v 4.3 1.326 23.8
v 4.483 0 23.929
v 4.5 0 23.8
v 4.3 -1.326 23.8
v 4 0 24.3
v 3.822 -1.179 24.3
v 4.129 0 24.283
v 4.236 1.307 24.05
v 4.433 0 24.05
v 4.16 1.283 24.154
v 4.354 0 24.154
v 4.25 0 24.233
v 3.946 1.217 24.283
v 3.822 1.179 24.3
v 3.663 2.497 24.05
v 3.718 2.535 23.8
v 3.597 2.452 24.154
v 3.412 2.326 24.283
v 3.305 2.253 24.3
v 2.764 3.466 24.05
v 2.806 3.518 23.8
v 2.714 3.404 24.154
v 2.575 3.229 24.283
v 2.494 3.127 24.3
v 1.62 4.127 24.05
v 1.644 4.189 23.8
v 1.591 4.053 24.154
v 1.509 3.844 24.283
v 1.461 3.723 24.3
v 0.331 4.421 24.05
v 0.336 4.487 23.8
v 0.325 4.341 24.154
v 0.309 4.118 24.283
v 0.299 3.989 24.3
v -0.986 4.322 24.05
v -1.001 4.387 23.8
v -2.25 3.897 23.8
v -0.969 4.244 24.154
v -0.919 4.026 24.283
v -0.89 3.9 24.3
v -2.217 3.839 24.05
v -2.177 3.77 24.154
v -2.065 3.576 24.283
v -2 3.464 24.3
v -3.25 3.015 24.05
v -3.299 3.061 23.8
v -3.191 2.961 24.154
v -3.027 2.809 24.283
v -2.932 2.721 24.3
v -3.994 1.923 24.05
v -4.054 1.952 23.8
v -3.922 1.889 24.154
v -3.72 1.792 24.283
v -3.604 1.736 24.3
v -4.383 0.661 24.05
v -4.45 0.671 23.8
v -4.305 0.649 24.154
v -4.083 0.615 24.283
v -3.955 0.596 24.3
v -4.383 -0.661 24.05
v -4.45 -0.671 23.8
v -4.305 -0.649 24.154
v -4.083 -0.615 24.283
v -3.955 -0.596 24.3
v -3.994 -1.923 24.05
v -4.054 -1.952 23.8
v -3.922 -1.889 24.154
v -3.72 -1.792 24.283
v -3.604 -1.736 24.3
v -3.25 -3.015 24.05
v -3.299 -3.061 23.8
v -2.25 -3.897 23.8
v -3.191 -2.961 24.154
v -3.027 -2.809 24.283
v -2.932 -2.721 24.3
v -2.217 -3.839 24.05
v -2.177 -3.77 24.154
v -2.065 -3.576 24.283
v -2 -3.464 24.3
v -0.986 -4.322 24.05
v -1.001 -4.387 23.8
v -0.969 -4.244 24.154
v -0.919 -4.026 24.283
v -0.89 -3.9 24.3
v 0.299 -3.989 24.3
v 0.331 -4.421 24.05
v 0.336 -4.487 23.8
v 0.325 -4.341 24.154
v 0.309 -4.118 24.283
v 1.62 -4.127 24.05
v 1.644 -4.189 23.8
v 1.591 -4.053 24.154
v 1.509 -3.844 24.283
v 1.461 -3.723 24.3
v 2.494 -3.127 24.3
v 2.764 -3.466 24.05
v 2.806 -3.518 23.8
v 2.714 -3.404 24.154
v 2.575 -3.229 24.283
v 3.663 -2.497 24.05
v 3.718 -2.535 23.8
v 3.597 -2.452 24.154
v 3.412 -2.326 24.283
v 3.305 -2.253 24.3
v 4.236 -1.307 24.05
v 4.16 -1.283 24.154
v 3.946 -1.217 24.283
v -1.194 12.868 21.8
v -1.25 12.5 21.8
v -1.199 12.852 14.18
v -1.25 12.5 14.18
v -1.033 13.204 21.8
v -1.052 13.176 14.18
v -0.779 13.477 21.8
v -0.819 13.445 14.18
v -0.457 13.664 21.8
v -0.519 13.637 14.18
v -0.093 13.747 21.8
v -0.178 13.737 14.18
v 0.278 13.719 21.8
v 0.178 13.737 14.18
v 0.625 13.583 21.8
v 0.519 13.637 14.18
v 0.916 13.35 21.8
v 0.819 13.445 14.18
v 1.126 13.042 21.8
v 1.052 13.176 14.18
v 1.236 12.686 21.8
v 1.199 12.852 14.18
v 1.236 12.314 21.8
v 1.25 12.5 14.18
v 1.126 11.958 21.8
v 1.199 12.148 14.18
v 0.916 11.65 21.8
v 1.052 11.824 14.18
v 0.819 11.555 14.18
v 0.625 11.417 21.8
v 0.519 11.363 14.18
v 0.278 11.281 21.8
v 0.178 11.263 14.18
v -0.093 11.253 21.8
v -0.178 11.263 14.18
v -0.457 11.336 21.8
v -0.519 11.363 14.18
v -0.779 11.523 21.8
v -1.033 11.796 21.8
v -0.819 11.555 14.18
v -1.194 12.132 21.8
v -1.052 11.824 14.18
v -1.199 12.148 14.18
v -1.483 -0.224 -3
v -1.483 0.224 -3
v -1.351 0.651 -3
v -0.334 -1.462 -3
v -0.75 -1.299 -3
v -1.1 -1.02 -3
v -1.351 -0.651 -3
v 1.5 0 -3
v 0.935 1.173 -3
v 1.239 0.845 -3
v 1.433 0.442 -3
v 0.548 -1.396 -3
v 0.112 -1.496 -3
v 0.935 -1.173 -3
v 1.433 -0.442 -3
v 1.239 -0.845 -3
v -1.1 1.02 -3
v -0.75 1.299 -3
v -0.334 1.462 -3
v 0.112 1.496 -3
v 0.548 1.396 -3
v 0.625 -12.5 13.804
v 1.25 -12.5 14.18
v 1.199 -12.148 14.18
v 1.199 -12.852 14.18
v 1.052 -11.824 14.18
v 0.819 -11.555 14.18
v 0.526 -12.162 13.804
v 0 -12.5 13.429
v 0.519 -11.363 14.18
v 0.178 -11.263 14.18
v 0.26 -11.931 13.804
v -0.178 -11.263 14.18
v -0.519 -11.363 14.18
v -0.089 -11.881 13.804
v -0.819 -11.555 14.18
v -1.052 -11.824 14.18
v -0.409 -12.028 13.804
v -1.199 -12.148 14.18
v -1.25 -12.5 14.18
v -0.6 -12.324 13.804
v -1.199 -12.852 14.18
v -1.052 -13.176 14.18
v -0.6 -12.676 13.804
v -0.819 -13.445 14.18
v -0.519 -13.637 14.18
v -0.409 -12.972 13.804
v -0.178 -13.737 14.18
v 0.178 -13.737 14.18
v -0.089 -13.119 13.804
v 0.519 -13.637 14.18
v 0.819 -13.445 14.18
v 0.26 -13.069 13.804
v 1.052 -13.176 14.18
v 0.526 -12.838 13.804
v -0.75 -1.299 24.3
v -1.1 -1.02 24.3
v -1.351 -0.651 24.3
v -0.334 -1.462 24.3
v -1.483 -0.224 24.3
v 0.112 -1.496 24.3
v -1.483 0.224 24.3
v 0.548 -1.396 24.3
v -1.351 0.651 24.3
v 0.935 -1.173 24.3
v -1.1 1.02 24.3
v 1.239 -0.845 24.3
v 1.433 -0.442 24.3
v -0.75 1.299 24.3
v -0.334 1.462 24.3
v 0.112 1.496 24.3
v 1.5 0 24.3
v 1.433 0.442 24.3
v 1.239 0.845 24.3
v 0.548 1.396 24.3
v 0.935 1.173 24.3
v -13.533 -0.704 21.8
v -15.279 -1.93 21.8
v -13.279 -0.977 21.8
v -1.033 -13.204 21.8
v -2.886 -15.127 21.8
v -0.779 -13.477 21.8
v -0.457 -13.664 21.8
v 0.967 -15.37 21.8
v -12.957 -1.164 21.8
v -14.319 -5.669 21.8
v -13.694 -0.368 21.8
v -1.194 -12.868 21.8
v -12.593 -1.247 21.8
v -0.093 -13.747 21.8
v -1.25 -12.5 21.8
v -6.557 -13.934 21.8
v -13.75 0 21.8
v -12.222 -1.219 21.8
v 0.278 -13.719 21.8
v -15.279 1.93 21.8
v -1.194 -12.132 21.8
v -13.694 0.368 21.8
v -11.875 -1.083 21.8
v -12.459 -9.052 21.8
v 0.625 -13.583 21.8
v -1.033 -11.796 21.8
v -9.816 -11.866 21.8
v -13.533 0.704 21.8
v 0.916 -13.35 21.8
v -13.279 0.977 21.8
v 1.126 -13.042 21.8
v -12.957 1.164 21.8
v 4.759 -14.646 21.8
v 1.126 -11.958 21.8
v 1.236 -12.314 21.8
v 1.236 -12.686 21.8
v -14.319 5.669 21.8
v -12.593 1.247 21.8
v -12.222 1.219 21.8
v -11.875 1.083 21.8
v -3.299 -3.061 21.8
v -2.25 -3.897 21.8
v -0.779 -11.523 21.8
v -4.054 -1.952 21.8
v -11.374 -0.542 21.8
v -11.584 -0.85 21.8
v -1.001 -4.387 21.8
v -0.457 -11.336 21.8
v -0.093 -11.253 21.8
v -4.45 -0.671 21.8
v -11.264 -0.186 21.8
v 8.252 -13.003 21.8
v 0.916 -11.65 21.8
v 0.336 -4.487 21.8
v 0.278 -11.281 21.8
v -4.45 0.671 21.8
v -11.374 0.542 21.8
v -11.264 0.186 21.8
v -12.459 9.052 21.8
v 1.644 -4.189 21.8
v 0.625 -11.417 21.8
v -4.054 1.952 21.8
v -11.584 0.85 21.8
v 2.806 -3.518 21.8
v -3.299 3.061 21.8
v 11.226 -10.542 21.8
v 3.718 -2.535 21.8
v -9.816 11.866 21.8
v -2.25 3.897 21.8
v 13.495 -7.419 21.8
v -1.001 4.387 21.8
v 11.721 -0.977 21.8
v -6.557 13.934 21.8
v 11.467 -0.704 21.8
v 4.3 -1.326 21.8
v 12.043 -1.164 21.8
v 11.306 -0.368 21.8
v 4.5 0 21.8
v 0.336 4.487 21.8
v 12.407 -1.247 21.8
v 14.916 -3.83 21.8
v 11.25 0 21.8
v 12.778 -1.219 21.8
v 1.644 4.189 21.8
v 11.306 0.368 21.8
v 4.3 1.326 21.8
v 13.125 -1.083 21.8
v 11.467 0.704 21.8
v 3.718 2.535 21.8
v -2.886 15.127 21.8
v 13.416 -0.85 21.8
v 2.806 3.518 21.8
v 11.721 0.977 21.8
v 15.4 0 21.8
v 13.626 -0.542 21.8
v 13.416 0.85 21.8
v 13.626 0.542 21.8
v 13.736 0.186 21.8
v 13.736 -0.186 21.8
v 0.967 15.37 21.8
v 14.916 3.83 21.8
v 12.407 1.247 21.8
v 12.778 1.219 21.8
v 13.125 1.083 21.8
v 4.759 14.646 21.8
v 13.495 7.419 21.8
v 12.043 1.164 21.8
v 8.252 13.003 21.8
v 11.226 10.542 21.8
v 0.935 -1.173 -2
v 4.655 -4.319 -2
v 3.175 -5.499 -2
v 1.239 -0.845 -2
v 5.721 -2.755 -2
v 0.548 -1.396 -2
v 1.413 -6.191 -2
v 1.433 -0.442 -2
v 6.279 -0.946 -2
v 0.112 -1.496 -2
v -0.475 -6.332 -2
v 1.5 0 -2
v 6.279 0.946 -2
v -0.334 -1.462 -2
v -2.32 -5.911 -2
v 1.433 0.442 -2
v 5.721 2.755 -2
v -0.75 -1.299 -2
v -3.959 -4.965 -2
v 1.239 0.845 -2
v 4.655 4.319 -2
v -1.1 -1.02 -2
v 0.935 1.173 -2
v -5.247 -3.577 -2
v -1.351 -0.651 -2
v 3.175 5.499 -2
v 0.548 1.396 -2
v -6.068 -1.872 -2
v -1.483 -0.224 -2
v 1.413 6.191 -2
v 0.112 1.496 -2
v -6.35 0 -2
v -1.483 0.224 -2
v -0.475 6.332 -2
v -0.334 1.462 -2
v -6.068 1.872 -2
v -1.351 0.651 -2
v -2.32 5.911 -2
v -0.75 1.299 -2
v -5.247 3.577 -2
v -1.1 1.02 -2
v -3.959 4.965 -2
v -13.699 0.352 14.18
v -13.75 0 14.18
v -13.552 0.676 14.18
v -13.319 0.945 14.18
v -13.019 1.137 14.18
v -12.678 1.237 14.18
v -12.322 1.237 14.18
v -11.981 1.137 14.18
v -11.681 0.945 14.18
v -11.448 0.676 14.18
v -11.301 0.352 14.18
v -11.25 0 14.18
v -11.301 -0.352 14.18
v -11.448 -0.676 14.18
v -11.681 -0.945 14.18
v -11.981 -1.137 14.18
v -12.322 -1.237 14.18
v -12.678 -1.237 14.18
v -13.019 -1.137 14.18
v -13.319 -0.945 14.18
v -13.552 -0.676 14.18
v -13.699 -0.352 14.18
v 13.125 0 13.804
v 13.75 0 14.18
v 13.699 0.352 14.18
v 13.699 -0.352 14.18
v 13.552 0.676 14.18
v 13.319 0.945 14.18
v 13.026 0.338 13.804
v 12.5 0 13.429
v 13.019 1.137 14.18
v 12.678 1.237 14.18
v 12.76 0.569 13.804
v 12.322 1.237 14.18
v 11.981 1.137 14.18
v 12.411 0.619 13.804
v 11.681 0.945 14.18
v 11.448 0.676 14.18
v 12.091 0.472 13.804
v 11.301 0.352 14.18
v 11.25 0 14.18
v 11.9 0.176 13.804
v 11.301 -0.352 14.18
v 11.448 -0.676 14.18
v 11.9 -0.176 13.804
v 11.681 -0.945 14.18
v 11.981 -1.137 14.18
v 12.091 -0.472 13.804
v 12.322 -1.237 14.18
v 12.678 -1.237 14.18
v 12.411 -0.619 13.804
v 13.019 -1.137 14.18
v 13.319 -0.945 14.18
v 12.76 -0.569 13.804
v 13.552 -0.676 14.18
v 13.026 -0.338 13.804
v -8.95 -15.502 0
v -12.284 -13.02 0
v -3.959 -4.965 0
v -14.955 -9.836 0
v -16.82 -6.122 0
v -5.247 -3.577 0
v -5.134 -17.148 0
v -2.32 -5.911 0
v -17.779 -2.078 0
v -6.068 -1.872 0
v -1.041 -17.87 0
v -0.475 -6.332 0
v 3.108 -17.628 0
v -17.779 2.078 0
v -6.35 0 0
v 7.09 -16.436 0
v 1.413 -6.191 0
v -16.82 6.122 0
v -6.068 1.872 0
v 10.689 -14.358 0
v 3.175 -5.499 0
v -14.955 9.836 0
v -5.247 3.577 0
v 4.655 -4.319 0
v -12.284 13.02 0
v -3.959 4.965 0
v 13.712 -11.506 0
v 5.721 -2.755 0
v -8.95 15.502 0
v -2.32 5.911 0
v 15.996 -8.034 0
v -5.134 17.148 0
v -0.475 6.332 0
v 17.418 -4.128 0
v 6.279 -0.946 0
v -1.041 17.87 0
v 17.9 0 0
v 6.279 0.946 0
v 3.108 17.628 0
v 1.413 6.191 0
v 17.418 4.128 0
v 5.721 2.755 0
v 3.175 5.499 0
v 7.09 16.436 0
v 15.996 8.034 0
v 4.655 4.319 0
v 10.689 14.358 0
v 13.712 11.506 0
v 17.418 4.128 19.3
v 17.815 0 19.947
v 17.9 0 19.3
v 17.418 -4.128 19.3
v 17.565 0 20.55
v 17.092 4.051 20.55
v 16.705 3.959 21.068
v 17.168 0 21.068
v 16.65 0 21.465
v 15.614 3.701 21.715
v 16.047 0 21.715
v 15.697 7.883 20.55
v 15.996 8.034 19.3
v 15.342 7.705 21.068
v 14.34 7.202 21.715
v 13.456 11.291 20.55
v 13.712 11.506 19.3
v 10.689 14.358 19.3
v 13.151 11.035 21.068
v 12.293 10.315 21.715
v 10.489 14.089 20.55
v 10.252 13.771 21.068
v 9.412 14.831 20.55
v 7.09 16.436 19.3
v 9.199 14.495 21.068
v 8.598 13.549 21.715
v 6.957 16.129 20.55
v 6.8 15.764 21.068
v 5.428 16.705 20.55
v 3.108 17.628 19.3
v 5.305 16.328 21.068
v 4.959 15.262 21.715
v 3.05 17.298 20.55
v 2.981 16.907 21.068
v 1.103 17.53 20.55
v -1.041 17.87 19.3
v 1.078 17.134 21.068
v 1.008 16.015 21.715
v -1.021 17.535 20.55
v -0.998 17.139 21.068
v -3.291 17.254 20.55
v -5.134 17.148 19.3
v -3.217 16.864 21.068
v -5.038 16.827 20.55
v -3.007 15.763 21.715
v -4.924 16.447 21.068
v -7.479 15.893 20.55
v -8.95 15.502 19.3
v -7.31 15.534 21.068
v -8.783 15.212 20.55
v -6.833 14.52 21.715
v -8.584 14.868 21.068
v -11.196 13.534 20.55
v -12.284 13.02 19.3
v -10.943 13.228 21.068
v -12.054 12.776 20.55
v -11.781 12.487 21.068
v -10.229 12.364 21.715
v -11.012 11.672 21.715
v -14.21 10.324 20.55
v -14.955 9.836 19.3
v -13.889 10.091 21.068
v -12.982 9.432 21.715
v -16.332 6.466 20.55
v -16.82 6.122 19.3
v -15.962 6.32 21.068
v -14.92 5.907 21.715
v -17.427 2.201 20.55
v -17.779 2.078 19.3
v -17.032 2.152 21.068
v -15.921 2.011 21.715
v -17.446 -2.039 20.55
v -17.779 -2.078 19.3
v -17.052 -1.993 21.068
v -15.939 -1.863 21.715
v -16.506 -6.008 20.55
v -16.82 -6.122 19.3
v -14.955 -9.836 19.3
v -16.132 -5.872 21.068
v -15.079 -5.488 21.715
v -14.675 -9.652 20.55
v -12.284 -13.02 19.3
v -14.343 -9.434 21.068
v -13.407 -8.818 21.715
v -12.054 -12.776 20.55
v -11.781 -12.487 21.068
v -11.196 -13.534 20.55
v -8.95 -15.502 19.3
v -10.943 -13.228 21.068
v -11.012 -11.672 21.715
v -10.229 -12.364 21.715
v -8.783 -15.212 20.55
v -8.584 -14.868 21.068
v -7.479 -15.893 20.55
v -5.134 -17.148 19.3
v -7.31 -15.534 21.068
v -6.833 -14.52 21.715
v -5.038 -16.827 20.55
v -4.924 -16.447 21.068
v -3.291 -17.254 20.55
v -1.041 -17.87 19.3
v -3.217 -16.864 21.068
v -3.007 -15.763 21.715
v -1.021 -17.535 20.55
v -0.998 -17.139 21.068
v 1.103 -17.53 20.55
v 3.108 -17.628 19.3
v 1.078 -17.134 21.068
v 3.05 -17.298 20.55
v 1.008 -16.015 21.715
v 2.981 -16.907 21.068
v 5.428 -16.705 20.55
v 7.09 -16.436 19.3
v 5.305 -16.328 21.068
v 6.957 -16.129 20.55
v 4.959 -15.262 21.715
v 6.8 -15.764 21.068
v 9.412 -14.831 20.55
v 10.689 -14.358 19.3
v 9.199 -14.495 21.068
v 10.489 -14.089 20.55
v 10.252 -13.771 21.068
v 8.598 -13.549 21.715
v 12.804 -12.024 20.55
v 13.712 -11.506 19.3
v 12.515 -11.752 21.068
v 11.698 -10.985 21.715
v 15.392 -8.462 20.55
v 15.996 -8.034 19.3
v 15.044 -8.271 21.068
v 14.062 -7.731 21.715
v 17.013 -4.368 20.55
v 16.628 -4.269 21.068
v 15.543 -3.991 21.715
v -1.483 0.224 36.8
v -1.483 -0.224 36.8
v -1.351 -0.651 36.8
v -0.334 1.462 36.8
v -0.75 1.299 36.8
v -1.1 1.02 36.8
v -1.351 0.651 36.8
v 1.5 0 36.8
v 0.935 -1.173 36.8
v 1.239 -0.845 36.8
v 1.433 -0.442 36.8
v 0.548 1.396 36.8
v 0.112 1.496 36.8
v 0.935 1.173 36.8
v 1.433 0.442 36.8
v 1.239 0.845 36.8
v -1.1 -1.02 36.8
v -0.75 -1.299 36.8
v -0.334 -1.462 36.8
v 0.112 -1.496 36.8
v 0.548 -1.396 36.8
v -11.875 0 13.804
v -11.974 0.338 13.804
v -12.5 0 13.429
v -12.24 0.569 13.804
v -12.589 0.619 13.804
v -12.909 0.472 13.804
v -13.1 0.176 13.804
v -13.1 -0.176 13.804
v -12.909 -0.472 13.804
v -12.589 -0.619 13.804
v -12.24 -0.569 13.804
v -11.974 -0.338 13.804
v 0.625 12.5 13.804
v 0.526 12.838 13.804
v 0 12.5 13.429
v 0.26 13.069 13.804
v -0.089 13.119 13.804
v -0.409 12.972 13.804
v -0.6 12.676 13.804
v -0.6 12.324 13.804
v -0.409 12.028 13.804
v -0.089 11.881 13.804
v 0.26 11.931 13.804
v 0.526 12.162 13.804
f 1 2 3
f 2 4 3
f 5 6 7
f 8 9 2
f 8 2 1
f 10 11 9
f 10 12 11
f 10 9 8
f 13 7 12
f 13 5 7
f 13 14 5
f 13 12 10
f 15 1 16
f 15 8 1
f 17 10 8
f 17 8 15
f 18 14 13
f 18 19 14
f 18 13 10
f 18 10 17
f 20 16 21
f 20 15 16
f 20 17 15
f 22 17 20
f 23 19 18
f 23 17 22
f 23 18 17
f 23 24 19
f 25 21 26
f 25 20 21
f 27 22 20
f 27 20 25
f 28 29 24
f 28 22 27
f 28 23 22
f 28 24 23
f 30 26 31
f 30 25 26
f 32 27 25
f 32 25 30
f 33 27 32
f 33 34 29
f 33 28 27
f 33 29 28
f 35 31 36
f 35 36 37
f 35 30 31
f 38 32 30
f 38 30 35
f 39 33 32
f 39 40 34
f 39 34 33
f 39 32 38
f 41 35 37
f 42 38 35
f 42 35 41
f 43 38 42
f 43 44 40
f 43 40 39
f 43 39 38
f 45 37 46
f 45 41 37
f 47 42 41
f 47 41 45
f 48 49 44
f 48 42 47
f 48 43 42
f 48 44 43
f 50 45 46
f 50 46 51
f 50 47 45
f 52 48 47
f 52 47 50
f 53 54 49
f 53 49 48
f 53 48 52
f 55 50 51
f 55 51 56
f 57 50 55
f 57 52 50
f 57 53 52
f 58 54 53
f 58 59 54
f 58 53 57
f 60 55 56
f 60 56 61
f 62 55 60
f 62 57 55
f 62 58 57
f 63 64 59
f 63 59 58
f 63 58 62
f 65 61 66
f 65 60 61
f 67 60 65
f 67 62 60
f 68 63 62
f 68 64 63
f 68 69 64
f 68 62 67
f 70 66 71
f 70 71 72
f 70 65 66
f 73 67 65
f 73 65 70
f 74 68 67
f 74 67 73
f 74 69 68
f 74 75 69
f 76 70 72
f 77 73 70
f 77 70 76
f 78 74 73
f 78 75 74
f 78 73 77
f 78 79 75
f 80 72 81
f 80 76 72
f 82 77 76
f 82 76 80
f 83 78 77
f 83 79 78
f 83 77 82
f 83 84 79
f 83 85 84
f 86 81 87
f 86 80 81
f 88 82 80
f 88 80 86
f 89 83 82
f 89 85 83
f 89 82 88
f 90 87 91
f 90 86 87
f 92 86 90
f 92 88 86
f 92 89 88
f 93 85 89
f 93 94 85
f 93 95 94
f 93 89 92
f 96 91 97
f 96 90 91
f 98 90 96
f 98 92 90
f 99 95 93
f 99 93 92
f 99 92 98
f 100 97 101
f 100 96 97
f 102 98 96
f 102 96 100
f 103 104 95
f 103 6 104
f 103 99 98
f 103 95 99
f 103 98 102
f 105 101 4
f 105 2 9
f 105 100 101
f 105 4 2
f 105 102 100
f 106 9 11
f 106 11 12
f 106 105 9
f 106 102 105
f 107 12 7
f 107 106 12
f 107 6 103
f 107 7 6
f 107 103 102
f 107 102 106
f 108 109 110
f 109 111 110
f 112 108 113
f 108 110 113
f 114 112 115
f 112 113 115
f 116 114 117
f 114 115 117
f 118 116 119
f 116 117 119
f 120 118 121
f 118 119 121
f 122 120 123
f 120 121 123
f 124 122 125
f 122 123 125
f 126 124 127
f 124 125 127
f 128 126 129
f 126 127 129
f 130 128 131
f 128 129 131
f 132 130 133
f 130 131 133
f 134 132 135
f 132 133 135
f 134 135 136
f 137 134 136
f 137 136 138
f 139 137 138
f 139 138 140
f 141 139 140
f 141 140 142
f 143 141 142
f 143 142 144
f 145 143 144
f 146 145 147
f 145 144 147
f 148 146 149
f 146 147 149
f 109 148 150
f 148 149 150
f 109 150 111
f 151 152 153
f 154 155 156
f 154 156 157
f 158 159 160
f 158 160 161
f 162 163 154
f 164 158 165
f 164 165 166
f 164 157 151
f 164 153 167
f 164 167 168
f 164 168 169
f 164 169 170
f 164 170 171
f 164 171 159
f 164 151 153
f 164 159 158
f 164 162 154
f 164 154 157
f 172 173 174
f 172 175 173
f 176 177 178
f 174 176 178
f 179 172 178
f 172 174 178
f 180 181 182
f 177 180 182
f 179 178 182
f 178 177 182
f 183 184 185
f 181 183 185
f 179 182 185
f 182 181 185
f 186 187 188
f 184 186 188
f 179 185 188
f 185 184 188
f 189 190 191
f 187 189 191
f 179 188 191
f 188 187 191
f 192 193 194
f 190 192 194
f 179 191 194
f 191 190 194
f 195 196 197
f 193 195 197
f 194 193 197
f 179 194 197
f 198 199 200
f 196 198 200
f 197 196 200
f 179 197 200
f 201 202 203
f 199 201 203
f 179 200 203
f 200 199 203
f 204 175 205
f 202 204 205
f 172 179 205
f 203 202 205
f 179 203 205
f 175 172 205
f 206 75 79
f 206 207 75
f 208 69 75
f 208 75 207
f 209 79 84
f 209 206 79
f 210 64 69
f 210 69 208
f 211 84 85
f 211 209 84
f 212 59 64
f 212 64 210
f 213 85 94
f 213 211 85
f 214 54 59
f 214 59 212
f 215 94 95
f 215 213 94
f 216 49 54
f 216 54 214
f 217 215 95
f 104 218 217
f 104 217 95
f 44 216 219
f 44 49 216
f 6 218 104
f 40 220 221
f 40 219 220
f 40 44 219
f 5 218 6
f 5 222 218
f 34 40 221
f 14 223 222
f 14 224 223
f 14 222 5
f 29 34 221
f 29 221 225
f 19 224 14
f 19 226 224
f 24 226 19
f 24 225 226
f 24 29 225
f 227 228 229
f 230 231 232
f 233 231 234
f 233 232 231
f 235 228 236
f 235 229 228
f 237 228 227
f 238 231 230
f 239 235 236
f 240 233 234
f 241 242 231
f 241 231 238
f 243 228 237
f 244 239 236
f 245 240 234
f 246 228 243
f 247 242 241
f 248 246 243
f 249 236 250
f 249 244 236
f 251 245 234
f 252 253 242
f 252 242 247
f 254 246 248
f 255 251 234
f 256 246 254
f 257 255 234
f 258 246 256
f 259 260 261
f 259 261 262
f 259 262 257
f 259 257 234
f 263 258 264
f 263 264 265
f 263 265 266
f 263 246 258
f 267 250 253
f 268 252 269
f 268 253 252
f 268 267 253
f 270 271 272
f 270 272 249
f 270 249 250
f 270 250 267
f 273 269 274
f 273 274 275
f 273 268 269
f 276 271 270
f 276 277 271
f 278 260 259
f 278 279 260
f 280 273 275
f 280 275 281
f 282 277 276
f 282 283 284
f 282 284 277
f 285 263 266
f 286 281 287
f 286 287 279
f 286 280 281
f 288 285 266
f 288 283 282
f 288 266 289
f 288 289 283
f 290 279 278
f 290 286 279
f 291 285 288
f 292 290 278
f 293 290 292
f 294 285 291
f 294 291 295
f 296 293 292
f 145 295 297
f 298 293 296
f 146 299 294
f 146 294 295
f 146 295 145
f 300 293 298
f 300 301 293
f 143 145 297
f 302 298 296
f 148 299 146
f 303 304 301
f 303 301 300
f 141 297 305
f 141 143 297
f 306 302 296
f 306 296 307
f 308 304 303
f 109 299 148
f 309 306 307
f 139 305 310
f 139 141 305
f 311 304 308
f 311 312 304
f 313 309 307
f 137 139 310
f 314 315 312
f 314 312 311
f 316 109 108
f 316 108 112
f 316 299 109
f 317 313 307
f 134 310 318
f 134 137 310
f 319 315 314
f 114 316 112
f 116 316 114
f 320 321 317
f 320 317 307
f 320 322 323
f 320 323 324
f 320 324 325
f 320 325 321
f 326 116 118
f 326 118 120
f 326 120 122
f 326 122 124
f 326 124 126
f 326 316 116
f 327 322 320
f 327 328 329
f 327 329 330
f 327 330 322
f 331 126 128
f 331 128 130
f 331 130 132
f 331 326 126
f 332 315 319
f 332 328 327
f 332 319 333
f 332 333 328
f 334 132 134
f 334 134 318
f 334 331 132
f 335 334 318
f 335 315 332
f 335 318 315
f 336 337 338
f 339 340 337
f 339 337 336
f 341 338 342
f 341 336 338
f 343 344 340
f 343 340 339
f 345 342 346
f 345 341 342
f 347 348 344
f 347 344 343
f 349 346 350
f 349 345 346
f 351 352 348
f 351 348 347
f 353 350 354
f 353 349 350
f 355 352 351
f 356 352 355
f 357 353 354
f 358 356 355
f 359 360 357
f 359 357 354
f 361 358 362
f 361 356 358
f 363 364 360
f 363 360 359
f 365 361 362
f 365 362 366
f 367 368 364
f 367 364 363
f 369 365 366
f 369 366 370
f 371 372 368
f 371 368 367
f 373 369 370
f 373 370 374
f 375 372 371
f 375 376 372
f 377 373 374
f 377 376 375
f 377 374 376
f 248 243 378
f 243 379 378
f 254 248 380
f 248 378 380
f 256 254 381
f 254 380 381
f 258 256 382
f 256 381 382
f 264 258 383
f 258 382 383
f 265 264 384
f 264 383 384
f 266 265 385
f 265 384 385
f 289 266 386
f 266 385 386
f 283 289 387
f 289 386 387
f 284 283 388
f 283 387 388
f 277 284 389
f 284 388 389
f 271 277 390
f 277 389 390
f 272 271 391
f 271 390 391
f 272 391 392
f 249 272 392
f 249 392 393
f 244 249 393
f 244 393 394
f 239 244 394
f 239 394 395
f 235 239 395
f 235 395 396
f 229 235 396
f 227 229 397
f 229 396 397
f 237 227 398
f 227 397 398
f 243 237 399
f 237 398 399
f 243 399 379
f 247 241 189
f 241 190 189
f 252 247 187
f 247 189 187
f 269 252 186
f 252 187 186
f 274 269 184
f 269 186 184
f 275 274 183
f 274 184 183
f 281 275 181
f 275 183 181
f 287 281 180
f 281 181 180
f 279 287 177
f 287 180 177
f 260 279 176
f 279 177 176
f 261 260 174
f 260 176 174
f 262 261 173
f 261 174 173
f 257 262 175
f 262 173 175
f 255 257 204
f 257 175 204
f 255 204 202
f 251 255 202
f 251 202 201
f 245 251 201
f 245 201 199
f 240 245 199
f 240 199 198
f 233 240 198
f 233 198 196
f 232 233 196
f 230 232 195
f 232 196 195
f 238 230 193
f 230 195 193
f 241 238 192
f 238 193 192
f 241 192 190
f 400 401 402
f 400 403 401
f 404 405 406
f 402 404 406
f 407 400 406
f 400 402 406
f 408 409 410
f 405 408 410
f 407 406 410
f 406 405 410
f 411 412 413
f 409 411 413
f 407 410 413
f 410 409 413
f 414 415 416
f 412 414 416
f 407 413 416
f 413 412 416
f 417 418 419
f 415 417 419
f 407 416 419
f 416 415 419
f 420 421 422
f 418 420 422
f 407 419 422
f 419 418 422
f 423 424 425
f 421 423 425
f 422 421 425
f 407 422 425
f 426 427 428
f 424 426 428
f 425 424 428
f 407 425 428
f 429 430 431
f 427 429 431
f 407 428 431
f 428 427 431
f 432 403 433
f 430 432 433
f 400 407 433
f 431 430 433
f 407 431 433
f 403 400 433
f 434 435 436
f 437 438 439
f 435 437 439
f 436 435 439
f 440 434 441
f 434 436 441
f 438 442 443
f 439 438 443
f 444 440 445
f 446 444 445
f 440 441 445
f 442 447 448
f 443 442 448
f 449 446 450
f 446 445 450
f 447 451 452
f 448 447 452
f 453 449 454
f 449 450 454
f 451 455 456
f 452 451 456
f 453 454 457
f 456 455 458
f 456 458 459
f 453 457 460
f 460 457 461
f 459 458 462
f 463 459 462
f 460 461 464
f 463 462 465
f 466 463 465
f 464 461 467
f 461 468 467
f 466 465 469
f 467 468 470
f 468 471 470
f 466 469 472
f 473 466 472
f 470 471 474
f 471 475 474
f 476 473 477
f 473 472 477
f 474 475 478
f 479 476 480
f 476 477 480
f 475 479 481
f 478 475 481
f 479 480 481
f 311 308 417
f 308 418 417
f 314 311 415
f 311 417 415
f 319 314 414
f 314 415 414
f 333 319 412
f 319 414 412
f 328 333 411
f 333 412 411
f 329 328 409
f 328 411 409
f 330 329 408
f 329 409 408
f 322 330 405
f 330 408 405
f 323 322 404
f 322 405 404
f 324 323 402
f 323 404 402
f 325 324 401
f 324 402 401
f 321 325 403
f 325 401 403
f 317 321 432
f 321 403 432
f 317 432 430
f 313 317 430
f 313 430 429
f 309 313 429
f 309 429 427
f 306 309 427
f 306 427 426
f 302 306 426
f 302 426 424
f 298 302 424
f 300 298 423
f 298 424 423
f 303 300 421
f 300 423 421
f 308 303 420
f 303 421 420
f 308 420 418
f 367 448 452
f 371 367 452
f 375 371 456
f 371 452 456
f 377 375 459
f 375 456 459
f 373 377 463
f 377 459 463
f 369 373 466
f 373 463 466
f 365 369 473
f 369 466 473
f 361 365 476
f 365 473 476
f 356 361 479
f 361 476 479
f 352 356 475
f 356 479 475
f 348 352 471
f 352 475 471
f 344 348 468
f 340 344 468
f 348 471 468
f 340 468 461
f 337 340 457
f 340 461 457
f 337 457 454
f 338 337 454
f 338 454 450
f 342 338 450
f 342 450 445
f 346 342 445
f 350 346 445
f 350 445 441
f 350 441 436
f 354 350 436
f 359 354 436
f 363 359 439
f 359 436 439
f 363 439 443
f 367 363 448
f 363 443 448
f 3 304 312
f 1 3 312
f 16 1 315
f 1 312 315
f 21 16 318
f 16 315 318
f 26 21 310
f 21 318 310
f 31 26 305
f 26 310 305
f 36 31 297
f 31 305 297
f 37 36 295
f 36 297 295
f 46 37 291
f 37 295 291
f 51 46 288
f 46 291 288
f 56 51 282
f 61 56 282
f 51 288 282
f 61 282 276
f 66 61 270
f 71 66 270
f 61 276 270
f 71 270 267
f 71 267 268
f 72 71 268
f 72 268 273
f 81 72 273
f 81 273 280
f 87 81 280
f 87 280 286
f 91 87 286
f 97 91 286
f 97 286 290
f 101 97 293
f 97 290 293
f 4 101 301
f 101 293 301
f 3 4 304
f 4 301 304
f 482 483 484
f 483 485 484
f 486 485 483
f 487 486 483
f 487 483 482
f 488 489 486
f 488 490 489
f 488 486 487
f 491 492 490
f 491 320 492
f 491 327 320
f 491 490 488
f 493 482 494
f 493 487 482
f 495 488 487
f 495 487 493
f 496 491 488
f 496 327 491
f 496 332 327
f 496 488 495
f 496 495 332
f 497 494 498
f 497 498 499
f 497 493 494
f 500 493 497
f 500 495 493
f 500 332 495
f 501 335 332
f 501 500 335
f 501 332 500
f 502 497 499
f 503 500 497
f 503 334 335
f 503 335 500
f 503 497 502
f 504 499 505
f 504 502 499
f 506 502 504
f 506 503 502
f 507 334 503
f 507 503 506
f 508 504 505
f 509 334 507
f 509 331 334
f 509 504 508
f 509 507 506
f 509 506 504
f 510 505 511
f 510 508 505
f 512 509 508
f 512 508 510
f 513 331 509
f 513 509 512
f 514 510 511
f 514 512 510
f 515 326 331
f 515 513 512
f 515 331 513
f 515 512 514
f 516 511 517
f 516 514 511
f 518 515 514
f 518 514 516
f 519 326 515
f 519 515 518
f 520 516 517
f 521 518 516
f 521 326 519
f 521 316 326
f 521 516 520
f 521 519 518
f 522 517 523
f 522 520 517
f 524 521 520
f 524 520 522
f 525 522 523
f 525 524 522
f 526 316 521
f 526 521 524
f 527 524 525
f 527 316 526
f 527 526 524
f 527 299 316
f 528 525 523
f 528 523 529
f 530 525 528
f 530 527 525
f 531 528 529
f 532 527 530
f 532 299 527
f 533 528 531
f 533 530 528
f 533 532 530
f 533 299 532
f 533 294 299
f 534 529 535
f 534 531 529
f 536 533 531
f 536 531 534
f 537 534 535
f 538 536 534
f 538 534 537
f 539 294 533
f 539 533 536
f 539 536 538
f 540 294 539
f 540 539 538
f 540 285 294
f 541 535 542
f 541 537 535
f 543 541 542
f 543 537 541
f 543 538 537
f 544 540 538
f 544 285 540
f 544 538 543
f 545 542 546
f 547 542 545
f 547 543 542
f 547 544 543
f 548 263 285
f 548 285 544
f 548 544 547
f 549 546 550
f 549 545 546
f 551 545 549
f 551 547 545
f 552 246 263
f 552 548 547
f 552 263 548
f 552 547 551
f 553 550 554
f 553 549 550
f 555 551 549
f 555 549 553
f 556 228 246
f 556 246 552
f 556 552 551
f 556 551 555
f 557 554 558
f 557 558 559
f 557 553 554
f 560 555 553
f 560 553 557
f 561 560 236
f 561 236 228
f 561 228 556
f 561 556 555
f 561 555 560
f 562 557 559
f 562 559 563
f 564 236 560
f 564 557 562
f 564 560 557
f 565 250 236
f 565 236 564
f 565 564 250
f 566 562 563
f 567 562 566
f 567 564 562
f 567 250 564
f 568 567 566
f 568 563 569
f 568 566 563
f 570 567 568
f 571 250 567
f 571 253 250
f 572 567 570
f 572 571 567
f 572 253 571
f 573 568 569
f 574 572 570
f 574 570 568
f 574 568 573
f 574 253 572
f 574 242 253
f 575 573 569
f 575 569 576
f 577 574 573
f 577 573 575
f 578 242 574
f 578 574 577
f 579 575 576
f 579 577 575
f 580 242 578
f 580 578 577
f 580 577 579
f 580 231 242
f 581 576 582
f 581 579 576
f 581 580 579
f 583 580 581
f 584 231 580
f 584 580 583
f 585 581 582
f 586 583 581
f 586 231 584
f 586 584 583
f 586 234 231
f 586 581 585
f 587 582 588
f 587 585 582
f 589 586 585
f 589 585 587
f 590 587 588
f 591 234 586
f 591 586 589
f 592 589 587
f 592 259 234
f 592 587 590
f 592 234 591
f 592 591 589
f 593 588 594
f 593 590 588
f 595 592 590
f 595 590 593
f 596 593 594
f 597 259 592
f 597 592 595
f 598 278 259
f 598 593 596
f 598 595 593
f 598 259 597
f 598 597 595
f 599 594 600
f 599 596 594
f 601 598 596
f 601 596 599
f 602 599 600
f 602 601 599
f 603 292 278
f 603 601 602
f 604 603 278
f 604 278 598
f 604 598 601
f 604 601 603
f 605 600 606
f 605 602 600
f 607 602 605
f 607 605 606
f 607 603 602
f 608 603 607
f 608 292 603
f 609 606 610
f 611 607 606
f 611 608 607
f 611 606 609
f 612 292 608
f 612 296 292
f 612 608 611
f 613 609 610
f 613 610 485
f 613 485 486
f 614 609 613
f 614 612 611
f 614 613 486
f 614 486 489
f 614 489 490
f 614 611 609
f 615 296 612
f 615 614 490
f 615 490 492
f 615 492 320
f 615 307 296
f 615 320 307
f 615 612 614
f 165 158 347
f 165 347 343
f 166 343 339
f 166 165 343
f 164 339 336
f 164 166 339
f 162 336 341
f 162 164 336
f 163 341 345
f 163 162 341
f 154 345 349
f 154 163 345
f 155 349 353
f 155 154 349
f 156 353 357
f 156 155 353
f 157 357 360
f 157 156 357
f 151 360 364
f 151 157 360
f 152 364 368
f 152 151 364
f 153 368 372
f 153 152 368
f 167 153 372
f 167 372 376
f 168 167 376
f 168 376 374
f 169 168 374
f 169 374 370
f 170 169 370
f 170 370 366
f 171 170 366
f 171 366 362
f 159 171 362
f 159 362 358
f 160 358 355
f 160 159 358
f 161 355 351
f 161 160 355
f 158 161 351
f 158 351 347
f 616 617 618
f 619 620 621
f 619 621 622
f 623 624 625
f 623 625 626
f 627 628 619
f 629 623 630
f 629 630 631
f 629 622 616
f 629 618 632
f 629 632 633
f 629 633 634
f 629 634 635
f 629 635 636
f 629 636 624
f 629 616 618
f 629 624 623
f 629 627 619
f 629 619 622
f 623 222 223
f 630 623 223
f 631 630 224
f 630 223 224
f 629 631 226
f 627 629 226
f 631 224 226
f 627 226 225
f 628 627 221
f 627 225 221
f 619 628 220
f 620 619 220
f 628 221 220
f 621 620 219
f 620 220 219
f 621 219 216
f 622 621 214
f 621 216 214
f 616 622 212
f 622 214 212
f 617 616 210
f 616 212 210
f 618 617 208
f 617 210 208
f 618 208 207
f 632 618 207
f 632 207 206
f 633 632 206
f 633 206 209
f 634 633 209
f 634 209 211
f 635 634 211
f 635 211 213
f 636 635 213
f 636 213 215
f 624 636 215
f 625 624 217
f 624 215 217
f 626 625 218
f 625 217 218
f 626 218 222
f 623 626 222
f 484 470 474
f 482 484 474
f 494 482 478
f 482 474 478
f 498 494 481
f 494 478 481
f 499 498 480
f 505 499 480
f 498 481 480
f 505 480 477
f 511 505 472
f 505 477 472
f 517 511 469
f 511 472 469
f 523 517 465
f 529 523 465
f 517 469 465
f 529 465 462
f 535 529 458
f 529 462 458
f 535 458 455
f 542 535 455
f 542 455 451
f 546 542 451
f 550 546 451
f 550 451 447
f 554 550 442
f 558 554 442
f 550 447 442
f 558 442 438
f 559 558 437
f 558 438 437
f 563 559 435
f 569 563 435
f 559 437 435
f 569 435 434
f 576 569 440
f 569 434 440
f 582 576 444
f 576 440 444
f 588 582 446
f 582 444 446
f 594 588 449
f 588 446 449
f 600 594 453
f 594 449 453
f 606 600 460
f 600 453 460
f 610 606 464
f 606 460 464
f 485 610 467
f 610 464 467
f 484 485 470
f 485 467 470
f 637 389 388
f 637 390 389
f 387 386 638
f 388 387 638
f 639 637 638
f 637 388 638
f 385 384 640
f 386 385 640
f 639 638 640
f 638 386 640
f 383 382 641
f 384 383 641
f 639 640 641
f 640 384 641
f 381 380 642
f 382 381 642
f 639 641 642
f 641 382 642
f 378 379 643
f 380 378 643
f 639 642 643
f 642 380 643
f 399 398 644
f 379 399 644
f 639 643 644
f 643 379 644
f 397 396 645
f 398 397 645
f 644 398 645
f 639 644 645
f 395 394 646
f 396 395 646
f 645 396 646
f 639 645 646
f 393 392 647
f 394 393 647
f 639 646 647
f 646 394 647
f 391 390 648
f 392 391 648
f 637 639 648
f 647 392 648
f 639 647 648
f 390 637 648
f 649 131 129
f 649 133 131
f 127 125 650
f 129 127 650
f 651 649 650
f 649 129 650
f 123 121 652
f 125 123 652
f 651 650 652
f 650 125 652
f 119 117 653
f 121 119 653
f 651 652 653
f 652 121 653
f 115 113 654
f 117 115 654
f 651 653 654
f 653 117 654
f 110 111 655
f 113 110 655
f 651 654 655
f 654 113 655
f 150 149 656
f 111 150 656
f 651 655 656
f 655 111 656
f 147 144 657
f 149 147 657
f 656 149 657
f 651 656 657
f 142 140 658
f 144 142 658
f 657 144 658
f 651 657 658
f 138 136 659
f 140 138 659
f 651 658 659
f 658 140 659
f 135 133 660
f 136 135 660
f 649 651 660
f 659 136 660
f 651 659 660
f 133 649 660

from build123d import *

# Parameters (mm, degrees)
SKETCH1_R                 = 17.9
BOSS_EXTRUDE1_DEPTH       = 21.8
FILLET1_R                 = 2.5
SKETCH2_R                 = 4.5
BOSS_EXTRUDE2_DEPTH       = 2.5
FILLET2_R                 = 0.5
M3X0_5_TAPPED_HOLE1_D     = 2.5
M3X0_5_TAPPED_HOLE1_DEPTH = 7.62
M3X0_5_TAPPED_HOLE1_TIP   = 0.751075774
SKETCH5_R                 = 1.5
BOSS_EXTRUDE3_DEPTH       = 12.5
SKETCH6_R                 = 6.35
BOSS_EXTRUDE4_DEPTH       = 2
BOSS_EXTRUDE5_START       = 1
SKETCH7_R                 = 1.5
BOSS_EXTRUDE5_DEPTH       = 1


with BuildPart() as part:
    # Sketch1 → Boss-Extrude1 (new body)
    with BuildSketch(Plane.XY):
        Circle(SKETCH1_R)
    extrude(amount=BOSS_EXTRUDE1_DEPTH)

    # Fillet1
    fillet1_edges = [part.edges().sort_by_distance(p)[0] for p in [
        (-17.9, 0, 21.8),
    ]]
    fillet(fillet1_edges, radius=FILLET1_R)

    # Sketch2 → Boss-Extrude2 (add)
    with BuildSketch(Plane.XY.offset(21.8)):
        Circle(SKETCH2_R)
    extrude(amount=BOSS_EXTRUDE2_DEPTH)

    # Fillet2
    fillet2_edges = [part.edges().sort_by_distance(p)[0] for p in [
        (-4.5, 0, 24.3),
    ]]
    fillet(fillet2_edges, radius=FILLET2_R)

    # M3x0.5 Tapped Hole1
    with Locations(Plane.XY.offset(21.8)):
        with Locations((0, 12.5), (0, -12.5), (12.5, 0), (-12.5, 0)):
            Hole(M3X0_5_TAPPED_HOLE1_D / 2, depth=M3X0_5_TAPPED_HOLE1_DEPTH)
            with Locations((0, 0, -(M3X0_5_TAPPED_HOLE1_DEPTH + M3X0_5_TAPPED_HOLE1_TIP / 2))):  # 118° drill point
                Cone(0, M3X0_5_TAPPED_HOLE1_D / 2, M3X0_5_TAPPED_HOLE1_TIP, mode=Mode.SUBTRACT)

    # Sketch5 → Boss-Extrude3 (add)
    with BuildSketch(Plane.XY.offset(24.3)):
        Circle(SKETCH5_R)
    extrude(amount=BOSS_EXTRUDE3_DEPTH)

    # Sketch6 → Boss-Extrude4 (add)
    with BuildSketch(Plane(origin=(0, 0, 0), x_dir=(-1, 0, 0), z_dir=(0, 0, -1))):
        Circle(SKETCH6_R)
    extrude(amount=BOSS_EXTRUDE4_DEPTH)

    # Sketch7 → Boss-Extrude5 (add)
    with BuildSketch(Plane(origin=(0, 0, -2), x_dir=(-1, 0, 0), z_dir=(0, 0, -1)).offset(BOSS_EXTRUDE5_START)):
        with Locations(Location((0, 0, 0), (0, 0, 180))):
            Circle(SKETCH7_R)
    extrude(amount=-BOSS_EXTRUDE5_DEPTH)


solid = part.part
